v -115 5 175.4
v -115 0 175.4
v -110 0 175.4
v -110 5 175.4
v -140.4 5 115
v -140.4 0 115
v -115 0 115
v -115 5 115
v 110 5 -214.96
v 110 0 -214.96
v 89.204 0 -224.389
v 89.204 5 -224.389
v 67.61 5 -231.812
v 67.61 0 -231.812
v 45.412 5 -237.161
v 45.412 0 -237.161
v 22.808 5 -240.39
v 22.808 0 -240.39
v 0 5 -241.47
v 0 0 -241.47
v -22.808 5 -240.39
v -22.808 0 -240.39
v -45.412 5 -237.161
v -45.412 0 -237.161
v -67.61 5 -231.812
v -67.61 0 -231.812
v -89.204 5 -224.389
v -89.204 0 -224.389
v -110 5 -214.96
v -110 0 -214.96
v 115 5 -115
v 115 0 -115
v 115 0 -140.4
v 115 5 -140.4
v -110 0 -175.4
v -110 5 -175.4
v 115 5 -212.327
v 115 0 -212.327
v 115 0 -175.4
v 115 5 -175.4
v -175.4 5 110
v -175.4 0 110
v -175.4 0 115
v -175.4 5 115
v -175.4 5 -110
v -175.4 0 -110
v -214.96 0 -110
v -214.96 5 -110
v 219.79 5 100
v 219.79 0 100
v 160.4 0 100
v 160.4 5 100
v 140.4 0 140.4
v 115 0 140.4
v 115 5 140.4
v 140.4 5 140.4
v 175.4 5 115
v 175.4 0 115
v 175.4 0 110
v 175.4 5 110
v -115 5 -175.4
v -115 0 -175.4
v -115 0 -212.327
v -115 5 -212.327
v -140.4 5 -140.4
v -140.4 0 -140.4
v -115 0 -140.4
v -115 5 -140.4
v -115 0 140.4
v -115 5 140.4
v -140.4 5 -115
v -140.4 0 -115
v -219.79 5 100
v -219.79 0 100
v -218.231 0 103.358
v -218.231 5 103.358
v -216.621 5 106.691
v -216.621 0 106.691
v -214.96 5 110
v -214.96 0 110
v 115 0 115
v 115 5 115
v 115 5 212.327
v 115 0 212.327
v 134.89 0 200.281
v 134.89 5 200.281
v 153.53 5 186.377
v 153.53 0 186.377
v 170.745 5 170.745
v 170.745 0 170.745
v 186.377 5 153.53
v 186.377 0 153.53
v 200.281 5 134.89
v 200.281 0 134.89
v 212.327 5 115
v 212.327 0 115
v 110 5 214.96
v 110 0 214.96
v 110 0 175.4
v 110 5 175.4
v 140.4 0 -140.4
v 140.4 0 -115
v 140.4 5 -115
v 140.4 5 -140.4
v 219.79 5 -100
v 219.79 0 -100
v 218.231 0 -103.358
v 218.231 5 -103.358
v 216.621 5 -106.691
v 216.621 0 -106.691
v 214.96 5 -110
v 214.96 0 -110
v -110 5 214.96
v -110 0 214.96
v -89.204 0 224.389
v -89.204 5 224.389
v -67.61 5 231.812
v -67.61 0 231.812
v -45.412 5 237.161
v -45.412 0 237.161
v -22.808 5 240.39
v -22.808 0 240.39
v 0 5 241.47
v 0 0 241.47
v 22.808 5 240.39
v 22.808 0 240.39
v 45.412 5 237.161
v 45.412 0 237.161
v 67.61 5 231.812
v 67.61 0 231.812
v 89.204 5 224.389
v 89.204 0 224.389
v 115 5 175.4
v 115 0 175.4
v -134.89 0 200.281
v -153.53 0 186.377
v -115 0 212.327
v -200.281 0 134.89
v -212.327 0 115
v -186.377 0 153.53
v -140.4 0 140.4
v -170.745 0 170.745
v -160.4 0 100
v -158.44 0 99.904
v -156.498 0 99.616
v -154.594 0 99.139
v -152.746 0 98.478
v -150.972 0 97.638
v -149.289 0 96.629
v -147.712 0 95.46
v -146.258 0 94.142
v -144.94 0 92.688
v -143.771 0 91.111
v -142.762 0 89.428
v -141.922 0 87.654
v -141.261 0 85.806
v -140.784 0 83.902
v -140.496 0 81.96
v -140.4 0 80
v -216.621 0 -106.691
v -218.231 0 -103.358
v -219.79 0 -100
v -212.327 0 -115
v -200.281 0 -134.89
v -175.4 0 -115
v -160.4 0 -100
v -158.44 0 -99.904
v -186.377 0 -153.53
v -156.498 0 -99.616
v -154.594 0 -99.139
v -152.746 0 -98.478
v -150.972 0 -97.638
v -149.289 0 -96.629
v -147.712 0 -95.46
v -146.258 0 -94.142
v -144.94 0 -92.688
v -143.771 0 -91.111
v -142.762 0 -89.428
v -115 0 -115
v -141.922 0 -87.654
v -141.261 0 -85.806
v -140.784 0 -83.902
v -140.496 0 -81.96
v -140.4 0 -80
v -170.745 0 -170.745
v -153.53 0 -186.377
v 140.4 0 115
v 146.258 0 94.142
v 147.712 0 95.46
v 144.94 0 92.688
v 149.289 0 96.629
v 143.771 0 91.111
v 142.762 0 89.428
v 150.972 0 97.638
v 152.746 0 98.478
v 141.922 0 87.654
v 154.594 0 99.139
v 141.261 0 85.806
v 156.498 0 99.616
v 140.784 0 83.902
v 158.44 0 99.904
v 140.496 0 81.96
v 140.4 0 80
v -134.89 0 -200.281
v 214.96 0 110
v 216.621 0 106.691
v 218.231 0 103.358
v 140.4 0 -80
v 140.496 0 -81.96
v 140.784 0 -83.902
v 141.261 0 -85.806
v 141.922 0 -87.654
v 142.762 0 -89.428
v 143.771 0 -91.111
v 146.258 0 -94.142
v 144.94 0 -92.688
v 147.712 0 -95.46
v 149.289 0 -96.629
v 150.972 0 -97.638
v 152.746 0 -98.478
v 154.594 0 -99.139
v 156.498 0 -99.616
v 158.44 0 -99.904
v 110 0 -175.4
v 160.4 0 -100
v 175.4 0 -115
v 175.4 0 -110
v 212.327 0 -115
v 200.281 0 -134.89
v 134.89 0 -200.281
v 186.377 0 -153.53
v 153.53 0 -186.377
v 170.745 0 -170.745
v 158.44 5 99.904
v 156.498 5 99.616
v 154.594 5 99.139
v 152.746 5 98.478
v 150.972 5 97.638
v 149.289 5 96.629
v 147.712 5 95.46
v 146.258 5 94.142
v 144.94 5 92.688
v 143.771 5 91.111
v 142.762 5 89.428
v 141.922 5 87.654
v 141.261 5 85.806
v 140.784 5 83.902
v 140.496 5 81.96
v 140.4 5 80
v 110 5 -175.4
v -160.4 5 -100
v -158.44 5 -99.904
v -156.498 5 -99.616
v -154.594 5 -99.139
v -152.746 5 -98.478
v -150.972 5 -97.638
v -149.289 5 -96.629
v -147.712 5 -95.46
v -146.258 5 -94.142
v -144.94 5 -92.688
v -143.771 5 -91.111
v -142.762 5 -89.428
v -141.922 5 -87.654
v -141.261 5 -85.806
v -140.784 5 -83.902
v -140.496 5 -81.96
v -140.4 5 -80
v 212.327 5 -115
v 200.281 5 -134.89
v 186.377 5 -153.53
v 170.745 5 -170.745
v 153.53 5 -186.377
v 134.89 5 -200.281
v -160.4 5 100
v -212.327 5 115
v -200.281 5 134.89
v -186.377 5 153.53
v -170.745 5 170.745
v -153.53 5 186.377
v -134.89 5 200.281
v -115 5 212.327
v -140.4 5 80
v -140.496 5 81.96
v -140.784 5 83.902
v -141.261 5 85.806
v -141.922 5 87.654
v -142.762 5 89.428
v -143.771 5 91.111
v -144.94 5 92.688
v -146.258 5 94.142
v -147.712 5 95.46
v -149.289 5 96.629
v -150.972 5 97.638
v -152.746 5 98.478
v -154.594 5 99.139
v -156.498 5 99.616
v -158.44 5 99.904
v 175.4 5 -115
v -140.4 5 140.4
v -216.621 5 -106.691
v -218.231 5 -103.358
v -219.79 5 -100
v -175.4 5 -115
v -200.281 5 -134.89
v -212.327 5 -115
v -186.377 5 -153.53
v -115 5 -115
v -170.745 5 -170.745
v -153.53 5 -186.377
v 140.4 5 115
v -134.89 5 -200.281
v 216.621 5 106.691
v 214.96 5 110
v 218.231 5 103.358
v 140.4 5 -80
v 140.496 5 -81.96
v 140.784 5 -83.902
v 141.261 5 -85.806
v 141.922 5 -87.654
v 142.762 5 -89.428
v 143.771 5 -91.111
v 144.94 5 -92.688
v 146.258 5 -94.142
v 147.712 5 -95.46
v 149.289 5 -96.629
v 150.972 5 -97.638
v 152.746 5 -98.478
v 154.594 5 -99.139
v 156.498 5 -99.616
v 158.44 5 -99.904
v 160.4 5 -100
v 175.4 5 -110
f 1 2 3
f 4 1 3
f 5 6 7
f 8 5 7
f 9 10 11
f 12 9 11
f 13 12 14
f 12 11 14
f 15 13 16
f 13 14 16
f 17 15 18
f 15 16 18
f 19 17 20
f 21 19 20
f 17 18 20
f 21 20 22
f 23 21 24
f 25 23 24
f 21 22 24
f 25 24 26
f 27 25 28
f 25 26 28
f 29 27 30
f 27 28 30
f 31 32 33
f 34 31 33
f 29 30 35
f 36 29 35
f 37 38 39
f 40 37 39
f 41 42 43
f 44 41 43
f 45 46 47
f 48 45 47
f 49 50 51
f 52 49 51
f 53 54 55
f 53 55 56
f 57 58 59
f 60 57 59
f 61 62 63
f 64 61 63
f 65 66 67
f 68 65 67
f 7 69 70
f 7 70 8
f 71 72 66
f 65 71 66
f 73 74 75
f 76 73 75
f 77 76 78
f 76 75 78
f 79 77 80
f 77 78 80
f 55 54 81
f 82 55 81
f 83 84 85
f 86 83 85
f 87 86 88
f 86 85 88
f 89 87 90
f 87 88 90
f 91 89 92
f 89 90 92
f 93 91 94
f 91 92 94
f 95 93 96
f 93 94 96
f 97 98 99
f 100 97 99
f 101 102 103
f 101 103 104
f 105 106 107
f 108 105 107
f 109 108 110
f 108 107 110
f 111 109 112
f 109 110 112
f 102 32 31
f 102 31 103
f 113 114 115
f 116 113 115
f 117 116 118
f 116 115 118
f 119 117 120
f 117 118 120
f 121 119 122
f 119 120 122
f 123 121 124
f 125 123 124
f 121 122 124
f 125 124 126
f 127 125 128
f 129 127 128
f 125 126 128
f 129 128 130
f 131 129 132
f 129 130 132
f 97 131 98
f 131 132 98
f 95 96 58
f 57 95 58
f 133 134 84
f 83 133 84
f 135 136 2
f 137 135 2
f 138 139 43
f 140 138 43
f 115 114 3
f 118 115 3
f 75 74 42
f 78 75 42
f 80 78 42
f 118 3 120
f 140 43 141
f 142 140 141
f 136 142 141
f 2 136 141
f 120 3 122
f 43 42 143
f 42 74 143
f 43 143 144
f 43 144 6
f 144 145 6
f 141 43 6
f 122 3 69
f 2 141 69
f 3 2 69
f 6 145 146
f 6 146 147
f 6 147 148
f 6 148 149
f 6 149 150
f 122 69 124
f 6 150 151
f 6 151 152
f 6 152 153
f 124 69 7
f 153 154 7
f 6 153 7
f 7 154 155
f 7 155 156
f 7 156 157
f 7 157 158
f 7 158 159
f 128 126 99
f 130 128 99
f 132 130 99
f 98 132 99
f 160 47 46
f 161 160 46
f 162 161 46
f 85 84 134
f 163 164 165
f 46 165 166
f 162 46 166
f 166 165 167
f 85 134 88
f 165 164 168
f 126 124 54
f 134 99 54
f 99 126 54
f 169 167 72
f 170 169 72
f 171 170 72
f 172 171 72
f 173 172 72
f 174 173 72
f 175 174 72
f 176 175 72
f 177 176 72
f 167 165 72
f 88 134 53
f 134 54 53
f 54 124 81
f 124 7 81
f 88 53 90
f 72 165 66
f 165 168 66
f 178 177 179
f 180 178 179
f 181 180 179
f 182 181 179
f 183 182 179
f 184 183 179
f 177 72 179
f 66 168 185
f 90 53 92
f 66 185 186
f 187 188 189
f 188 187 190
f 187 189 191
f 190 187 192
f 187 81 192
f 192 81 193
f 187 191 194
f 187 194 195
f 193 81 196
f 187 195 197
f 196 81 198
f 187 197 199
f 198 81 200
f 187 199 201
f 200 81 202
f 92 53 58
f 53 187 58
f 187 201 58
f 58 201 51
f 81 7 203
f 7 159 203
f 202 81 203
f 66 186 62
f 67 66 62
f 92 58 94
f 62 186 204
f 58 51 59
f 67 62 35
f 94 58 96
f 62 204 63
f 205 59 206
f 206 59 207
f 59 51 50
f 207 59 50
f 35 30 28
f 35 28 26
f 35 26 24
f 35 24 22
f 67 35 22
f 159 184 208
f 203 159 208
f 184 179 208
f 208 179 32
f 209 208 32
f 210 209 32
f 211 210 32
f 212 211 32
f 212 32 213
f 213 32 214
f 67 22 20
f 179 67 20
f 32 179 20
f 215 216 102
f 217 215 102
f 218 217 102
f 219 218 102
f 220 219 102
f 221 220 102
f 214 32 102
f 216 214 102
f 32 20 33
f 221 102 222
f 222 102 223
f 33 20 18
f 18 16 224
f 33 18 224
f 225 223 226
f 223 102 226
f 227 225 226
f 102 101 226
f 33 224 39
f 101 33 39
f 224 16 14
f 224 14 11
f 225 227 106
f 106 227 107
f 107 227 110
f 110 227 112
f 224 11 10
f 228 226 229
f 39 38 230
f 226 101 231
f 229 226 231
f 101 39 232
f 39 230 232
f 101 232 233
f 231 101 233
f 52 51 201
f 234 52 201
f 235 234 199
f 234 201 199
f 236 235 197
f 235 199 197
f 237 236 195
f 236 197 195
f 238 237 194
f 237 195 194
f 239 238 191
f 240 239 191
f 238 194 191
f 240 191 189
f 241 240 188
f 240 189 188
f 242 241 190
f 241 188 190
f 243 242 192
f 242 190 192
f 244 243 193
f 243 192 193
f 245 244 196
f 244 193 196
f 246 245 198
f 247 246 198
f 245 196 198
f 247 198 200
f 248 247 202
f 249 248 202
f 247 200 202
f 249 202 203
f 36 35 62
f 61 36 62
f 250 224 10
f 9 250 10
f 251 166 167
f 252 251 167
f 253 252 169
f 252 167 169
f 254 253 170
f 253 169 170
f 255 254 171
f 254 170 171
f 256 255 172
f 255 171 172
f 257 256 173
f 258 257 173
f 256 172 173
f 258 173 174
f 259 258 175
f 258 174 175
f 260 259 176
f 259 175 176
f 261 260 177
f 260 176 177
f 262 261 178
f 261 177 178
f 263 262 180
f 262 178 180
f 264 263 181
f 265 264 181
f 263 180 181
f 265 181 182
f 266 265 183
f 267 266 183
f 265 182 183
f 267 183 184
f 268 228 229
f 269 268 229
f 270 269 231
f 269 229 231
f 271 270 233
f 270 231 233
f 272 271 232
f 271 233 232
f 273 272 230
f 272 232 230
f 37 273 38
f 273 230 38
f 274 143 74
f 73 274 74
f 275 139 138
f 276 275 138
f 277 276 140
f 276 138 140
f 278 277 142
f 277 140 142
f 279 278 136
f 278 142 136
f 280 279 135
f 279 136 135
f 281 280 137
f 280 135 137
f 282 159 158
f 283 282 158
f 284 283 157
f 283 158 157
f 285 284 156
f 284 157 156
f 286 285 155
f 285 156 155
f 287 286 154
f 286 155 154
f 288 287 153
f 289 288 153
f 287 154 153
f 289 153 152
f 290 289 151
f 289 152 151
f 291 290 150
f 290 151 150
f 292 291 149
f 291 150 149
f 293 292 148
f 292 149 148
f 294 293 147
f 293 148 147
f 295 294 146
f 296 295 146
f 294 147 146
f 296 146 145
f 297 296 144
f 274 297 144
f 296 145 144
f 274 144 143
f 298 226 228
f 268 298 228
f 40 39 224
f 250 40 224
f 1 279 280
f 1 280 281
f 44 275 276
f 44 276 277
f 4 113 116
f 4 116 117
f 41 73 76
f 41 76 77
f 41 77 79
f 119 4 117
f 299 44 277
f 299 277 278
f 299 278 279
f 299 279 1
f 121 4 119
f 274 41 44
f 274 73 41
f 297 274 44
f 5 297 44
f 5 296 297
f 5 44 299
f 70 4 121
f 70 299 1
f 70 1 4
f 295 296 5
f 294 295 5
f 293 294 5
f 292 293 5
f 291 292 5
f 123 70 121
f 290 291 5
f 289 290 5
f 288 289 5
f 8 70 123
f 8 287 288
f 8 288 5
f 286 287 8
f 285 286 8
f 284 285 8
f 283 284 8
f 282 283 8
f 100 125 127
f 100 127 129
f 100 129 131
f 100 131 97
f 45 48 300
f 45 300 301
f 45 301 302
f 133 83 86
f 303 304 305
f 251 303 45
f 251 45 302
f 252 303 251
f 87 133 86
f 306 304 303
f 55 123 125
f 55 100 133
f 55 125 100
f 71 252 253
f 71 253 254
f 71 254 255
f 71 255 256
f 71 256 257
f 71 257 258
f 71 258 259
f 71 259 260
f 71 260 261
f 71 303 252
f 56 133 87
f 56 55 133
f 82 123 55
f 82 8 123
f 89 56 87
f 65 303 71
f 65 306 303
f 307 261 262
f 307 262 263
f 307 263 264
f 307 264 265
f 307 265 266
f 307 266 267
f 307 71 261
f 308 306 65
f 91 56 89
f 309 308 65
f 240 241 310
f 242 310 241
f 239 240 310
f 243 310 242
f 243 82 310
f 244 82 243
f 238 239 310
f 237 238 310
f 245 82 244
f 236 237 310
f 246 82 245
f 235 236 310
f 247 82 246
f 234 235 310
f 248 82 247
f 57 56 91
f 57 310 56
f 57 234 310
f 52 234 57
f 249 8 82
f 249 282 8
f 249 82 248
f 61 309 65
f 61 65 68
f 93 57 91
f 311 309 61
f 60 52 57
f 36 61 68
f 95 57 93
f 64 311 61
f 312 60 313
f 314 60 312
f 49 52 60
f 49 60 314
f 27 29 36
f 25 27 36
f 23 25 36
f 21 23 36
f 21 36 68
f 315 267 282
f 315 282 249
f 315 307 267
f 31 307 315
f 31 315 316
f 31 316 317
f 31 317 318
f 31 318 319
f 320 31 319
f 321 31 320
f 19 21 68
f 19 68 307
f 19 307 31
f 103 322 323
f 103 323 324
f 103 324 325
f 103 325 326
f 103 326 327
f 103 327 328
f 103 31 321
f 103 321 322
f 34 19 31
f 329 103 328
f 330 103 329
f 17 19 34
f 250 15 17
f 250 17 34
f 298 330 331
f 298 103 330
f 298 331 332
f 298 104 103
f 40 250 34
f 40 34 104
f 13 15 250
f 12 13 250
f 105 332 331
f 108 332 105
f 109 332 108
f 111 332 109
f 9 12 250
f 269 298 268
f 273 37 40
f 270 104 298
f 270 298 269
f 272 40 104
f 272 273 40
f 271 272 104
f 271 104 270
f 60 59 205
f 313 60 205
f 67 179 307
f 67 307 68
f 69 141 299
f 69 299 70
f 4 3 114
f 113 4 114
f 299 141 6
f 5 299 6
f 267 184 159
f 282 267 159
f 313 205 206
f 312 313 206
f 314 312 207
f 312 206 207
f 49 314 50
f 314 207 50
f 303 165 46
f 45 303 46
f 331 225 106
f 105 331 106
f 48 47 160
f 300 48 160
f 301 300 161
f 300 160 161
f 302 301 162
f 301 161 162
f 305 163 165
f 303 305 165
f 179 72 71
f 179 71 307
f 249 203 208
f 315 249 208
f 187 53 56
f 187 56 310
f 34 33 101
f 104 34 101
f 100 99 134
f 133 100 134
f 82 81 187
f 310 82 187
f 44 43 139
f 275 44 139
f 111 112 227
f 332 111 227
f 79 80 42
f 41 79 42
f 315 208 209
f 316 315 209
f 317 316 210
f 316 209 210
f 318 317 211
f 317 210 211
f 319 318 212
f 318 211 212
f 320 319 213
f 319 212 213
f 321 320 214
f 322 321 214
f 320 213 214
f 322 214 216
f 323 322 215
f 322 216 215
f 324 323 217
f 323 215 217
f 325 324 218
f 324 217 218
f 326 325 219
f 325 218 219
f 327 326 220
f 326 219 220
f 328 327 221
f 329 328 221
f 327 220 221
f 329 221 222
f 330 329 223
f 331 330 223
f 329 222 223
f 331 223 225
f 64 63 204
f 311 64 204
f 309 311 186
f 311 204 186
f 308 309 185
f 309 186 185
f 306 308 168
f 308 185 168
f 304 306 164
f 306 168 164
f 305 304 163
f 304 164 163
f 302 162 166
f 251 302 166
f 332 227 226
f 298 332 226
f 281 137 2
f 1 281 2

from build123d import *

# Parameters (mm, degrees)
SKETCH1_W           = 25.4
SKETCH1_H           = 25.4
BOSS_EXTRUDE1_DEPTH = 5


with BuildPart() as part:
    # Sketch1 → Boss-Extrude1 (new body)
    with BuildSketch(Plane(origin=(0, 0, 0), x_dir=(1, 0, 0), z_dir=(0, 1, 0))):
        with BuildLine():
            Line((-219.790265708, 100), (-160.4, 100))
            ThreePointArc((-160.4, 100), (-146.257864376, 94.142135624), (-140.4, 80))
            Line((-140.4, 80), (-140.4, -80))
            ThreePointArc((-140.4, -80), (-146.257864376, -94.142135624), (-160.4, -100))
            Line((-160.4, -100), (-219.790265708, -100))
            ThreePointArc((-219.790265708, -100), (-217.432582206, -105.027772971), (-214.959905331, -110))
            Line((-214.959905331, -110), (-175.4, -110))
            Line((-175.4, -110), (-175.4, -115))
            Line((-175.4, -115), (-212.327014061, -115))
            ThreePointArc((-212.327014061, -115), (-170.745074453, -170.745074453), (-115, -212.327014061))
            Line((-115, -212.327014061), (-115, -175.4))
            Line((-115, -175.4), (-110, -175.4))
            Line((-110, -175.4), (-110, -214.959905331))
            ThreePointArc((-110, -214.959905331), (0, -241.47), (110, -214.959905331))
            Line((110, -214.959905331), (110, -175.4))
            Line((110, -175.4), (115, -175.4))
            Line((115, -175.4), (115, -212.327014061))
            ThreePointArc((115, -212.327014061), (170.745074453, -170.745074453), (212.327014061, -115))
            Line((212.327014061, -115), (175.4, -115))
            Line((175.4, -115), (175.4, -110))
            Line((175.4, -110), (214.959905331, -110))
            ThreePointArc((214.959905331, -110), (217.432582206, -105.027772971), (219.790265708, -100))
            Line((219.790265708, -100), (160.4, -100))
            ThreePointArc((160.4, -100), (146.257864376, -94.142135624), (140.4, -80))
            Line((140.4, -80), (140.4, 80))
            ThreePointArc((140.4, 80), (146.257864376, 94.142135624), (160.4, 100))
            Line((160.4, 100), (219.790265708, 100))
            ThreePointArc((219.790265708, 100), (217.432582206, 105.027772971), (214.959905331, 110))
            Line((214.959905331, 110), (175.4, 110))
            Line((175.4, 110), (175.4, 115))
            Line((175.4, 115), (212.327014061, 115))
            ThreePointArc((212.327014061, 115), (170.745074453, 170.745074453), (115, 212.327014061))
            Line((115, 212.327014061), (115, 175.4))
            Line((115, 175.4), (110, 175.4))
            Line((110, 175.4), (110, 214.959905331))
            ThreePointArc((110, 214.959905331), (0, 241.47), (-110, 214.959905331))
            Line((-110, 214.959905331), (-110, 175.4))
            Line((-110, 175.4), (-115, 175.4))
            Line((-115, 175.4), (-115, 212.327014061))
            ThreePointArc((-115, 212.327014061), (-170.745074453, 170.745074453), (-212.327014061, 115))
            Line((-212.327014061, 115), (-175.4, 115))
            Line((-175.4, 115), (-175.4, 110))
            Line((-175.4, 110), (-214.959905331, 110))
            ThreePointArc((-214.959905331, 110), (-217.432582206, 105.027772971), (-219.790265708, 100))
        make_face()
        with Locations((127.7, 127.7)):
            Rectangle(SKETCH1_W, SKETCH1_H, mode=Mode.SUBTRACT)
        with Locations((-127.7, 127.7)):
            Rectangle(SKETCH1_W, SKETCH1_H, mode=Mode.SUBTRACT)
        with Locations((127.7, -127.7)):
            Rectangle(SKETCH1_W, SKETCH1_H, mode=Mode.SUBTRACT)
        with Locations((-127.7, -127.7)):
            Rectangle(SKETCH1_W, SKETCH1_H, mode=Mode.SUBTRACT)
    extrude(amount=BOSS_EXTRUDE1_DEPTH)


solid = part.part
